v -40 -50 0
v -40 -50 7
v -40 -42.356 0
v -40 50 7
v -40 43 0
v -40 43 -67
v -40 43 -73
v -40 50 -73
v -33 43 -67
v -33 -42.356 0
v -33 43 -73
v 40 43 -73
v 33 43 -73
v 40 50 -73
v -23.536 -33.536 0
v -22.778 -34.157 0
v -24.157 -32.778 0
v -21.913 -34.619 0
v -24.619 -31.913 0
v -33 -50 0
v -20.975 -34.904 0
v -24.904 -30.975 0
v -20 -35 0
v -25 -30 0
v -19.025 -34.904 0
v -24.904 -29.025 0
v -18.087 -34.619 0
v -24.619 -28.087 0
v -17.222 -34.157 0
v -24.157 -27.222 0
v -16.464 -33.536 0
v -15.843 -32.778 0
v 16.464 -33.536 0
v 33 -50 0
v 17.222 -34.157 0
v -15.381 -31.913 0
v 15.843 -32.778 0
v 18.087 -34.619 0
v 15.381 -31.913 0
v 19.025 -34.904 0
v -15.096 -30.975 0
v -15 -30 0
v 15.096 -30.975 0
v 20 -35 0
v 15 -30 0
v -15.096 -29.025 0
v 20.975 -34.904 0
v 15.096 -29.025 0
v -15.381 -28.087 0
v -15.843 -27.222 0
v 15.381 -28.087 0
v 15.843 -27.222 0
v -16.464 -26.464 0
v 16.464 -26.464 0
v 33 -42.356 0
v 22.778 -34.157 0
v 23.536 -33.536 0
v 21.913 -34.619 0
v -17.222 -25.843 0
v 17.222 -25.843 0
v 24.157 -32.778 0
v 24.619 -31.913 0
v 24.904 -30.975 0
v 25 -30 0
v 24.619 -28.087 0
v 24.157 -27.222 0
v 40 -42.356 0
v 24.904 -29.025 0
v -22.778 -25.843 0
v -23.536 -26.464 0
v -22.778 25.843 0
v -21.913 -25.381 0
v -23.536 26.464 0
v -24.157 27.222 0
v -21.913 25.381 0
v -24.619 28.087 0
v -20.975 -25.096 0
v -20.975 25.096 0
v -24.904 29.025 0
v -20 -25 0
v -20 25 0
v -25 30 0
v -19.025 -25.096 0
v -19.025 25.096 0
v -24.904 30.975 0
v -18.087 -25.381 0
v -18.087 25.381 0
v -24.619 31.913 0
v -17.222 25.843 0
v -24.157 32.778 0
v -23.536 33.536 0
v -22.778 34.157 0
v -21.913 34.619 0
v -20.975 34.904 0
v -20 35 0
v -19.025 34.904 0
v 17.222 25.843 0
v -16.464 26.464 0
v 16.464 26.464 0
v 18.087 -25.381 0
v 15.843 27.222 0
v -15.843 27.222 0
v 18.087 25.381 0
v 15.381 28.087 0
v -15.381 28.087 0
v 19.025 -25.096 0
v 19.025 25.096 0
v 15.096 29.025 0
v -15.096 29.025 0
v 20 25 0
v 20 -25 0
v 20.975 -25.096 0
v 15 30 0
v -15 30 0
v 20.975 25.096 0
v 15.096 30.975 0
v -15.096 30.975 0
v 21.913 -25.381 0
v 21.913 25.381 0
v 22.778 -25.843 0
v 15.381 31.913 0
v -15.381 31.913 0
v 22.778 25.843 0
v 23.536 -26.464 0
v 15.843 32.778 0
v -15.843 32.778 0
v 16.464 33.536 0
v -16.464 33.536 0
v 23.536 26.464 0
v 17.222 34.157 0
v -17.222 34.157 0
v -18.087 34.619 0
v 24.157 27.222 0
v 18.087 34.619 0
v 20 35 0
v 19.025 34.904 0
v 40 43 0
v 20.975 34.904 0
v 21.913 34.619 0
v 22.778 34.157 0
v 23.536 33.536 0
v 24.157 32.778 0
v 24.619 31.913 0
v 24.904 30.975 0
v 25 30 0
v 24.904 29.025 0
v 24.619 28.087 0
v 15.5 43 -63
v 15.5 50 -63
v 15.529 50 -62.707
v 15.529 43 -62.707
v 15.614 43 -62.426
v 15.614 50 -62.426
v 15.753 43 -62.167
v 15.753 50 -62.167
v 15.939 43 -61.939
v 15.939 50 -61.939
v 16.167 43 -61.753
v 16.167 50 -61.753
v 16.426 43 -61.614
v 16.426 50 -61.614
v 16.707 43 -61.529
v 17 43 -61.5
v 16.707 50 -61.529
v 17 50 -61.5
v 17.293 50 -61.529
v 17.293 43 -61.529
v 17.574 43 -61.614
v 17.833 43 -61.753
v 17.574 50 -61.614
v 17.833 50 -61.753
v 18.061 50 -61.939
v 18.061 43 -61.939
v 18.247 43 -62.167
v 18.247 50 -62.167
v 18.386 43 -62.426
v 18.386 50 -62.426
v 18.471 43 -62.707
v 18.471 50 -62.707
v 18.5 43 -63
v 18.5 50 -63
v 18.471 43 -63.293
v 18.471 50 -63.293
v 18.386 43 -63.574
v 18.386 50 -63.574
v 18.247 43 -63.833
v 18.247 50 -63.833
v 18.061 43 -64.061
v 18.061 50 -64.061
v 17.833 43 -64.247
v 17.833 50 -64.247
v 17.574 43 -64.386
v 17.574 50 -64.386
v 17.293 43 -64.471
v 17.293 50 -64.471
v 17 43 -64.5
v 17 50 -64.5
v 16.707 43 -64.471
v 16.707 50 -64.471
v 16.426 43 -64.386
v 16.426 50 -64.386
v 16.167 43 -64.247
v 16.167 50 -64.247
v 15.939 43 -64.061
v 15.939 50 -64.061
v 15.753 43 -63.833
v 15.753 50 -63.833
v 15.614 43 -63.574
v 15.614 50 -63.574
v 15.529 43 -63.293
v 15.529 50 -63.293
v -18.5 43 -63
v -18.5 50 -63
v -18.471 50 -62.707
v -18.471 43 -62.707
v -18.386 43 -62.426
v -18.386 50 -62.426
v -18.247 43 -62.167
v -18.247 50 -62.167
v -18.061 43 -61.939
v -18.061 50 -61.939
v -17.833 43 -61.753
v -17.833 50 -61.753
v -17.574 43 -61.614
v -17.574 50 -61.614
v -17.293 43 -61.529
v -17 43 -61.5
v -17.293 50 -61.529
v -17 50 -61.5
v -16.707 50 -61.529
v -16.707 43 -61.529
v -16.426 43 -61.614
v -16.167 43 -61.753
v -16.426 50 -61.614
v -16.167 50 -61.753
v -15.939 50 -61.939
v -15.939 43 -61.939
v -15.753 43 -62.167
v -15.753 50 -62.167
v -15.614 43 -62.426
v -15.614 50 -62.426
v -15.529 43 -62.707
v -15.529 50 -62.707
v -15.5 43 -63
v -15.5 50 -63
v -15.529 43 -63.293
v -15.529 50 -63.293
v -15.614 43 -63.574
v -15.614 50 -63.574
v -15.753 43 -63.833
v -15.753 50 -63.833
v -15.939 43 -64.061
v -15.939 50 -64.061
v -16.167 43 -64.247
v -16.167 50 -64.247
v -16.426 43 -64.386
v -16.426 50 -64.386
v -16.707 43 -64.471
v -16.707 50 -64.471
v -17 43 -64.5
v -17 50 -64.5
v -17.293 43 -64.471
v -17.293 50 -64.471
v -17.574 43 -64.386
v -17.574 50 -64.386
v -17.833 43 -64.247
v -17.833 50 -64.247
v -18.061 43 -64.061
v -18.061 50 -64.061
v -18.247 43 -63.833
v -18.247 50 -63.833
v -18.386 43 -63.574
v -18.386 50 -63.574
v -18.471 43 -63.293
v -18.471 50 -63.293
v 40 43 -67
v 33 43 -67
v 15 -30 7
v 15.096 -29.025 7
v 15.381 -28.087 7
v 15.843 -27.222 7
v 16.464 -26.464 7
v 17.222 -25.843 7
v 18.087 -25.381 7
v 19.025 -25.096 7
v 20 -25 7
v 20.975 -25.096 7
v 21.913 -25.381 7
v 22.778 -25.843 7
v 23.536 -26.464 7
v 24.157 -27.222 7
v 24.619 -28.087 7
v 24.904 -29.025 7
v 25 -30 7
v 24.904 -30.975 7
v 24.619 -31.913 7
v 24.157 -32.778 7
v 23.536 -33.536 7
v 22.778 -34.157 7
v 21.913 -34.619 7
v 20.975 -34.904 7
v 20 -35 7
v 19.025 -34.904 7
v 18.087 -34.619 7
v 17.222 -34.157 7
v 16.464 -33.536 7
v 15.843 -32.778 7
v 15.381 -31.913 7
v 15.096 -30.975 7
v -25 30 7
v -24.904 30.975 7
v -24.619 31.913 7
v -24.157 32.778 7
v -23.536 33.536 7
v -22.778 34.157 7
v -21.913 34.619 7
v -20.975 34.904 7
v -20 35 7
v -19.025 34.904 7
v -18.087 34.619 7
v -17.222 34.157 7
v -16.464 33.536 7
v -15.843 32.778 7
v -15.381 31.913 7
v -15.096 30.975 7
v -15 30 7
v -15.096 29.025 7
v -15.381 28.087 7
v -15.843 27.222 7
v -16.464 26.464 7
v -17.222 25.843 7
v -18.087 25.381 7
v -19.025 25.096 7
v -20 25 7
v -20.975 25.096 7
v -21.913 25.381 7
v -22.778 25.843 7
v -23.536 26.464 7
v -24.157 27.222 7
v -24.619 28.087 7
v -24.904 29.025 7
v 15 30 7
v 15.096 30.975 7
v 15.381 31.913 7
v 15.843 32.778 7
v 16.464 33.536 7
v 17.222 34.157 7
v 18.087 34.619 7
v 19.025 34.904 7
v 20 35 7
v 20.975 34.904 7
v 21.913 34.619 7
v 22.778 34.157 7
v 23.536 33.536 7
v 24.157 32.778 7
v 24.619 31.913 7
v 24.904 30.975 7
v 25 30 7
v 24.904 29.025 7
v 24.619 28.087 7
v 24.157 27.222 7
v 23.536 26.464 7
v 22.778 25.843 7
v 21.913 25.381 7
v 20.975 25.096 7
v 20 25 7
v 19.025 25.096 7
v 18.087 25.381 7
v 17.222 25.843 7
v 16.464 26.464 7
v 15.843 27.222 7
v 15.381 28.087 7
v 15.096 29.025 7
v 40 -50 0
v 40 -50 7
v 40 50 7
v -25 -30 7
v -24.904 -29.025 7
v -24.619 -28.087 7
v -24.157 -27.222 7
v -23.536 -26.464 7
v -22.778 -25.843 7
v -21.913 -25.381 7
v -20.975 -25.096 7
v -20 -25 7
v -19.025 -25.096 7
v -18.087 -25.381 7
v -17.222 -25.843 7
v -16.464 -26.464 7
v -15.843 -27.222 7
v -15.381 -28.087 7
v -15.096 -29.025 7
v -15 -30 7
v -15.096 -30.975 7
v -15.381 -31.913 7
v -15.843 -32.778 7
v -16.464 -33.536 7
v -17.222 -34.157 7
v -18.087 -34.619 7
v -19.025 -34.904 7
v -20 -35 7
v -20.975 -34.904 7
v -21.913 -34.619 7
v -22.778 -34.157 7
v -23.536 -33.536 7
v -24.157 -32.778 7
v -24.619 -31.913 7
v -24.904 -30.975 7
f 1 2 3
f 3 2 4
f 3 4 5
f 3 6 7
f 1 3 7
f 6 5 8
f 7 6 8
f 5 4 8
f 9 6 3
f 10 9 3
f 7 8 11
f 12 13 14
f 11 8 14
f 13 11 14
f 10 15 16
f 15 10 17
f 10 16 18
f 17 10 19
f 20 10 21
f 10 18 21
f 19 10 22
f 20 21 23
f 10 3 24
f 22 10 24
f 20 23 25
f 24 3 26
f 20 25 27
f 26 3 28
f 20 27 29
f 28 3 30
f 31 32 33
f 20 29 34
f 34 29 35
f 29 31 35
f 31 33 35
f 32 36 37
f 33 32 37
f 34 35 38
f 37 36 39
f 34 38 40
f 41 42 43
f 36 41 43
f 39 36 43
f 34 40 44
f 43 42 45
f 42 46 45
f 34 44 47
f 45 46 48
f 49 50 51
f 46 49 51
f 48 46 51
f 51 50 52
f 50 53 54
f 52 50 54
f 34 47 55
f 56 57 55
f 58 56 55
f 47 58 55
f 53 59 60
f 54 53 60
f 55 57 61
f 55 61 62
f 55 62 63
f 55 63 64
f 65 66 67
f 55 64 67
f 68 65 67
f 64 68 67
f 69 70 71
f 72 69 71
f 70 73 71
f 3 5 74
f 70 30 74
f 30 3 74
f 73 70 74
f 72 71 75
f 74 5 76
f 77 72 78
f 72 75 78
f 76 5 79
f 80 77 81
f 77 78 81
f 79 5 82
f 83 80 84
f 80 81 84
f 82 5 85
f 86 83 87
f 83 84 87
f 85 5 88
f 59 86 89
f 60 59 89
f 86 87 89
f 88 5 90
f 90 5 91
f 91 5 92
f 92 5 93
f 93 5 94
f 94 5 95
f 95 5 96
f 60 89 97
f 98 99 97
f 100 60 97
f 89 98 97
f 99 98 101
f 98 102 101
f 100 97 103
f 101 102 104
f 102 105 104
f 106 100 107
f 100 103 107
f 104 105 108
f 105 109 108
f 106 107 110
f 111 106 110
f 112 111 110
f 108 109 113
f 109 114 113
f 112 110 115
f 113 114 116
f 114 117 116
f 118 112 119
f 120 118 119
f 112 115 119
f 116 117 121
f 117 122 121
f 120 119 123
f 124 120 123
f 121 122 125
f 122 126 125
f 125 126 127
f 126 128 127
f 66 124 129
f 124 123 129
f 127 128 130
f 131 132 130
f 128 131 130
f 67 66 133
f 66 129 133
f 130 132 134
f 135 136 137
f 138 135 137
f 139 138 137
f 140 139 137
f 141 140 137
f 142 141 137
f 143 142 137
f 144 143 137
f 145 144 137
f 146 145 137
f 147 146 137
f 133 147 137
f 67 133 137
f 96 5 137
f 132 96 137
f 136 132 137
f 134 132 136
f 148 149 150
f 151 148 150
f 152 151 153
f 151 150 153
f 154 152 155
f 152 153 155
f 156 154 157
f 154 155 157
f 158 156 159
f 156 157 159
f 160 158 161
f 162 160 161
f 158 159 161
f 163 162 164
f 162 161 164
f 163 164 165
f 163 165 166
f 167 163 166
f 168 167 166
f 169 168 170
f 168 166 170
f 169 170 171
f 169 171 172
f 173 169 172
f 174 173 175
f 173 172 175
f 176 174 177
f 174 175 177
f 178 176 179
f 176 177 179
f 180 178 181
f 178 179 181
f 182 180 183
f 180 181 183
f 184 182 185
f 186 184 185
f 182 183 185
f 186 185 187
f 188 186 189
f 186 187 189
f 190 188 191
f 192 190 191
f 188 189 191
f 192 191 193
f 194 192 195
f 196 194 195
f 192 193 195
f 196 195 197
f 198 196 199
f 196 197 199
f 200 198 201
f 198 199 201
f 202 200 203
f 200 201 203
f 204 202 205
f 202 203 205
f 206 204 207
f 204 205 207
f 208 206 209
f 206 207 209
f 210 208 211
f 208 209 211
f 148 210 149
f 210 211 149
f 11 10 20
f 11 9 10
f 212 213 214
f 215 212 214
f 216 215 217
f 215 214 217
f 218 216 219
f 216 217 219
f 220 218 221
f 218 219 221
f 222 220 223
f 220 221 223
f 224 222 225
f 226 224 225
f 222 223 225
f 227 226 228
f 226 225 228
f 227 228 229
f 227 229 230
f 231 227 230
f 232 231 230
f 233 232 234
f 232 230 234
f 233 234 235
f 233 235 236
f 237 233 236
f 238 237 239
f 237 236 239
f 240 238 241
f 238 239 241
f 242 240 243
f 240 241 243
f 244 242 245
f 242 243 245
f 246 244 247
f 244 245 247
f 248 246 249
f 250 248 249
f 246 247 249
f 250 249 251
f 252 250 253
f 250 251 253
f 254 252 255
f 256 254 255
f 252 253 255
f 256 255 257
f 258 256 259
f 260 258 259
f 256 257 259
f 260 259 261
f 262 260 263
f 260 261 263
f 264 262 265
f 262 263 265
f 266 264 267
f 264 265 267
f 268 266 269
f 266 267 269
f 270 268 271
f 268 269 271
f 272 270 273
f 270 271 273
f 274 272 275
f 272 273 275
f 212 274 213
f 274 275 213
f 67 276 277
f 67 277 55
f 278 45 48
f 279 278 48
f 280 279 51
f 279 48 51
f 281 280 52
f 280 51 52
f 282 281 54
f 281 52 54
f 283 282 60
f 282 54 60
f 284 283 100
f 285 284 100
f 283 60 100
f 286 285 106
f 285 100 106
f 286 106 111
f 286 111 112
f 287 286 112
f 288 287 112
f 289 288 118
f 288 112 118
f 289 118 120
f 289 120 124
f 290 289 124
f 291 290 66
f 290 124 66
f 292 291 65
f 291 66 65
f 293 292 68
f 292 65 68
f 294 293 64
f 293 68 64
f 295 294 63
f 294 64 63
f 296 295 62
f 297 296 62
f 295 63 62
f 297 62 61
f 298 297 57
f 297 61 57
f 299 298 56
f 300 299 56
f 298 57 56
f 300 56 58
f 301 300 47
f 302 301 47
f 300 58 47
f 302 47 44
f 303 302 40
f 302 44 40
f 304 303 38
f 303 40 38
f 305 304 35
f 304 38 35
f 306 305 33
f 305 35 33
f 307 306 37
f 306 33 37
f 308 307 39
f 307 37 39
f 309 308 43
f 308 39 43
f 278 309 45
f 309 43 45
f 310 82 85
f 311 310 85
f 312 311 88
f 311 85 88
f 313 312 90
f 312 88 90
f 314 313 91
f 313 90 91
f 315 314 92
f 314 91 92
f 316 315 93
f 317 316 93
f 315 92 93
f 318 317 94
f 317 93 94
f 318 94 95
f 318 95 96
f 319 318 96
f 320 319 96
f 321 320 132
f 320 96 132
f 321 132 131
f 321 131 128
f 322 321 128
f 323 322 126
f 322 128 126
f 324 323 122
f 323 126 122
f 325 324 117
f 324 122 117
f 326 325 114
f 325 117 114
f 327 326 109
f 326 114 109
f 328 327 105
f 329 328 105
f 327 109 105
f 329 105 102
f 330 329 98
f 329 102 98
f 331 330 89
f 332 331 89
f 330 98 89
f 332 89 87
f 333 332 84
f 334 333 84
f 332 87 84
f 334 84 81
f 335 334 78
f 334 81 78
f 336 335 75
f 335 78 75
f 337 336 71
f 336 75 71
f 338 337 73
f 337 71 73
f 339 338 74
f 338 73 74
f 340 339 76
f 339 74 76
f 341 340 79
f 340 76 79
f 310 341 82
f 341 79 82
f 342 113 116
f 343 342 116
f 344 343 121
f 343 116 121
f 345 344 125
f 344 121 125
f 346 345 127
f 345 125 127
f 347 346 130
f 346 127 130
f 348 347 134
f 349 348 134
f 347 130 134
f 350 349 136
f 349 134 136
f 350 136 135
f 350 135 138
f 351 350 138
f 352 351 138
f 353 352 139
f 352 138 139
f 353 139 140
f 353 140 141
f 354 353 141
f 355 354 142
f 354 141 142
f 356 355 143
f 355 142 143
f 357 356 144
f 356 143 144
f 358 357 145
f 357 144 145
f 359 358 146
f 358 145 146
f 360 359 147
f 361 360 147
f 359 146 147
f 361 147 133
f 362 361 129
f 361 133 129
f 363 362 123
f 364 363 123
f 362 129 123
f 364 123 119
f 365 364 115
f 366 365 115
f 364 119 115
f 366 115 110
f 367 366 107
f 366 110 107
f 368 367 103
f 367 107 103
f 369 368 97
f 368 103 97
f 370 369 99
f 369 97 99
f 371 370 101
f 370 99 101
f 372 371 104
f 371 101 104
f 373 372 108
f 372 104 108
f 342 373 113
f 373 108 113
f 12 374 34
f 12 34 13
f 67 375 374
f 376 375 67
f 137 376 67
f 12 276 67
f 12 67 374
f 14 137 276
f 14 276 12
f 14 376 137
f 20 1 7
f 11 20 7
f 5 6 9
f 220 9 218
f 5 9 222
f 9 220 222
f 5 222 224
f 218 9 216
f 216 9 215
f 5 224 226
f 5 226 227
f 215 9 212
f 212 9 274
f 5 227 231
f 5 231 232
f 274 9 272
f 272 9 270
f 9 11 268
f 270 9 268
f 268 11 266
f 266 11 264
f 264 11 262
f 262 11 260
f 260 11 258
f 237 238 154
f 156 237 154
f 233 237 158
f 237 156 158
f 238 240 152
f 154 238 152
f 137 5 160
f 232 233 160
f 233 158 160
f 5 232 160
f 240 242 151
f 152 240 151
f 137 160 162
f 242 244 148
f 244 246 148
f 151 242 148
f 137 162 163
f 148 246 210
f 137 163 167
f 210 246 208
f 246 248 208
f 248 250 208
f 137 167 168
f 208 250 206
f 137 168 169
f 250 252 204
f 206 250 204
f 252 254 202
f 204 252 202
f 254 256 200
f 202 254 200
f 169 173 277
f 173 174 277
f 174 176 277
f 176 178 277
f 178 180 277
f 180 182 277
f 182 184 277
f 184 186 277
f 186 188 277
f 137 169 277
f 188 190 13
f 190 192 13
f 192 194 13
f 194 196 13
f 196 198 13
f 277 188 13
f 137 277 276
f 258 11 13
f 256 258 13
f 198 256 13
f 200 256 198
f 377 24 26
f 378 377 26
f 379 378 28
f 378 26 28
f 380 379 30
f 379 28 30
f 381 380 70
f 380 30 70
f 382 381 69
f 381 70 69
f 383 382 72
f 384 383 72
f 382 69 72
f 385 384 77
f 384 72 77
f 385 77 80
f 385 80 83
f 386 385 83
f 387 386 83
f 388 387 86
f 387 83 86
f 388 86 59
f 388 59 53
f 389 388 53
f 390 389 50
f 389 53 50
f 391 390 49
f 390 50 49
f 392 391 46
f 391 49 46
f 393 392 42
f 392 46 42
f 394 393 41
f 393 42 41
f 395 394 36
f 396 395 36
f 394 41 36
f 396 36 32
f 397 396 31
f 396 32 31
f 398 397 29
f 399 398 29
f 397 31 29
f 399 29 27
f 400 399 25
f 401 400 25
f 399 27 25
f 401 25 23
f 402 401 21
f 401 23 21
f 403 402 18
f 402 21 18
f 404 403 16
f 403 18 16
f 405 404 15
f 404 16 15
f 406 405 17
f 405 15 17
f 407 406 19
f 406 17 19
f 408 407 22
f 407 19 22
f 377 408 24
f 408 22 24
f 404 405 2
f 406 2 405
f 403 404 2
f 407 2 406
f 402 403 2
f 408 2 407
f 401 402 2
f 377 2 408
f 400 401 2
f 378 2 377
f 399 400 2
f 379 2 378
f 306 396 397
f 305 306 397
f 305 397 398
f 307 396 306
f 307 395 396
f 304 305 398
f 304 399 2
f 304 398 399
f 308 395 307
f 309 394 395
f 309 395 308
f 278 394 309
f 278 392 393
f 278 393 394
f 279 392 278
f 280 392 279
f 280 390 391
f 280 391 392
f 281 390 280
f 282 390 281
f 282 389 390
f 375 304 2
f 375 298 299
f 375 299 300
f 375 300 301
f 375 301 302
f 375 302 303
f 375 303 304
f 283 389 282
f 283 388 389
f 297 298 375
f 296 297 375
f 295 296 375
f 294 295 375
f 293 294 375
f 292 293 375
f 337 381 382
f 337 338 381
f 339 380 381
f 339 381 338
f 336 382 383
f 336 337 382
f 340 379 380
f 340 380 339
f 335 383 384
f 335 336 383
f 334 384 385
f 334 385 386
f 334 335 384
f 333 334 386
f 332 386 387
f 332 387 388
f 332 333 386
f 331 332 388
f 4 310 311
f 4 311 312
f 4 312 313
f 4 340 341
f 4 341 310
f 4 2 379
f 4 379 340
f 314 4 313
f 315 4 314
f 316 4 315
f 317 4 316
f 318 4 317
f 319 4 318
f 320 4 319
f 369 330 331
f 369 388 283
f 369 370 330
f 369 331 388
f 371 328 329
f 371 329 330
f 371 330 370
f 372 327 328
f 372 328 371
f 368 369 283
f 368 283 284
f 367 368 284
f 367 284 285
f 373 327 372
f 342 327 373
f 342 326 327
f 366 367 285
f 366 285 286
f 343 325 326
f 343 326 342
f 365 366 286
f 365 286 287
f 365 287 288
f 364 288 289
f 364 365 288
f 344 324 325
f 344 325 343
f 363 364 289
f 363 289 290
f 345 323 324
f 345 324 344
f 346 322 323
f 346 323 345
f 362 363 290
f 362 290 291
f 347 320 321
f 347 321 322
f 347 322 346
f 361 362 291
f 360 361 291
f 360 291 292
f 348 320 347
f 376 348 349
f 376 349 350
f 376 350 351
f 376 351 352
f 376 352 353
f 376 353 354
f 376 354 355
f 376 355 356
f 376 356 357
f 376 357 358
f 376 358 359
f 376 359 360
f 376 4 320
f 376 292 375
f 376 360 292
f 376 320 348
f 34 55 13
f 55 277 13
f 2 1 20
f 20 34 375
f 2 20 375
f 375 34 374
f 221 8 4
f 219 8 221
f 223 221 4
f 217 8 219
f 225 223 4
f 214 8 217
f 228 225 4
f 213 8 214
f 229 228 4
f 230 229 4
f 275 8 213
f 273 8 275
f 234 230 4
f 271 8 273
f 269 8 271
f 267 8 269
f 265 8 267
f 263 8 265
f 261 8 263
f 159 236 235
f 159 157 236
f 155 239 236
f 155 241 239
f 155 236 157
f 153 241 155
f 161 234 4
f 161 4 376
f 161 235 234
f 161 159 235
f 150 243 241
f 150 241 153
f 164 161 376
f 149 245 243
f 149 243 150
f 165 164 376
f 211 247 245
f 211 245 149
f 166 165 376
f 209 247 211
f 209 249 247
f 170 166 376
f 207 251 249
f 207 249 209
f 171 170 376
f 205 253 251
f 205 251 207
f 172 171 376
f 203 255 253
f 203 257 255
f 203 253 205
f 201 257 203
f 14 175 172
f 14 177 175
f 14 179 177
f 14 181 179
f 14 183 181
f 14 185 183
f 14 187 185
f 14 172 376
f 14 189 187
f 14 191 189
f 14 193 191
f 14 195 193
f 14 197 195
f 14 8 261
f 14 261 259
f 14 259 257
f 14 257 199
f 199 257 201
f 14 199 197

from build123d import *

# Parameters (mm, degrees)
SKETCH1_W           = 80
SKETCH1_H           = 100
BOSS_EXTRUDE1_DEPTH = 7
SKETCH2_R           = 5
CUT_EXTRUDE1_DEPTH  = 7
SKETCH4_W           = 80
SKETCH4_H           = 80
BOSS_EXTRUDE2_DEPTH = 7
BOSS_EXTRUDE4_DEPTH = 7
SKETCH6_R           = 1.5
CUT_EXTRUDE2_DEPTH  = 7


with BuildPart() as part:
    # Sketch1 → Boss-Extrude1 (new body)
    with BuildSketch(Plane.XY):
        Rectangle(SKETCH1_W, SKETCH1_H)
    extrude(amount=BOSS_EXTRUDE1_DEPTH)

    # Sketch2 → Cut-Extrude1 (cut)
    with BuildSketch(Plane(origin=(0, 0, 0), x_dir=(-1, 0, 0), z_dir=(0, 0, -1))):
        with Locations((-20, 30)):
            Circle(SKETCH2_R)
        with Locations((20, 30)):
            Circle(SKETCH2_R)
        with Locations((20, -30)):
            Circle(SKETCH2_R)
        with Locations((-20, -30)):
            Circle(SKETCH2_R)
    extrude(amount=-CUT_EXTRUDE1_DEPTH, mode=Mode.SUBTRACT)

    # Sketch4 → Boss-Extrude2 (add)
    with BuildSketch(Plane(origin=(0, 50, 0), x_dir=(1, 0, 0), z_dir=(0, 1, 0))):
        with Locations((0, 33)):
            Rectangle(SKETCH4_W, SKETCH4_H)
    extrude(amount=-BOSS_EXTRUDE2_DEPTH)

    # Sketch5 → Boss-Extrude4 (add)
    with BuildSketch(Plane(origin=(40, 0, 0), x_dir=(0, 0, -1), z_dir=(1, 0, 0))):
        Polygon((0, -50), (73, 43), (67, 43), (-6, -50), align=None)
    boss_extrude4 = extrude(amount=-BOSS_EXTRUDE4_DEPTH)

    # Mirror3: Boss-Extrude4 across plane
    add(boss_extrude4.mirror(Plane(origin=(0, 0, 0), x_dir=(0, 0, 1), z_dir=(1, 0, 0))))

    # Sketch6 → Cut-Extrude2 (cut)
    with BuildSketch(Plane(origin=(0, 50, 0), x_dir=(1, 0, 0), z_dir=(0, 1, 0))):
        with Locations(Location((-17, 63, 0), (0, 0, 180))):
            Circle(SKETCH6_R)
        with Locations(Location((17, 63, 0), (0, 0, 180))):
            Circle(SKETCH6_R)
    extrude(amount=-CUT_EXTRUDE2_DEPTH, mode=Mode.SUBTRACT)


solid = part.part
